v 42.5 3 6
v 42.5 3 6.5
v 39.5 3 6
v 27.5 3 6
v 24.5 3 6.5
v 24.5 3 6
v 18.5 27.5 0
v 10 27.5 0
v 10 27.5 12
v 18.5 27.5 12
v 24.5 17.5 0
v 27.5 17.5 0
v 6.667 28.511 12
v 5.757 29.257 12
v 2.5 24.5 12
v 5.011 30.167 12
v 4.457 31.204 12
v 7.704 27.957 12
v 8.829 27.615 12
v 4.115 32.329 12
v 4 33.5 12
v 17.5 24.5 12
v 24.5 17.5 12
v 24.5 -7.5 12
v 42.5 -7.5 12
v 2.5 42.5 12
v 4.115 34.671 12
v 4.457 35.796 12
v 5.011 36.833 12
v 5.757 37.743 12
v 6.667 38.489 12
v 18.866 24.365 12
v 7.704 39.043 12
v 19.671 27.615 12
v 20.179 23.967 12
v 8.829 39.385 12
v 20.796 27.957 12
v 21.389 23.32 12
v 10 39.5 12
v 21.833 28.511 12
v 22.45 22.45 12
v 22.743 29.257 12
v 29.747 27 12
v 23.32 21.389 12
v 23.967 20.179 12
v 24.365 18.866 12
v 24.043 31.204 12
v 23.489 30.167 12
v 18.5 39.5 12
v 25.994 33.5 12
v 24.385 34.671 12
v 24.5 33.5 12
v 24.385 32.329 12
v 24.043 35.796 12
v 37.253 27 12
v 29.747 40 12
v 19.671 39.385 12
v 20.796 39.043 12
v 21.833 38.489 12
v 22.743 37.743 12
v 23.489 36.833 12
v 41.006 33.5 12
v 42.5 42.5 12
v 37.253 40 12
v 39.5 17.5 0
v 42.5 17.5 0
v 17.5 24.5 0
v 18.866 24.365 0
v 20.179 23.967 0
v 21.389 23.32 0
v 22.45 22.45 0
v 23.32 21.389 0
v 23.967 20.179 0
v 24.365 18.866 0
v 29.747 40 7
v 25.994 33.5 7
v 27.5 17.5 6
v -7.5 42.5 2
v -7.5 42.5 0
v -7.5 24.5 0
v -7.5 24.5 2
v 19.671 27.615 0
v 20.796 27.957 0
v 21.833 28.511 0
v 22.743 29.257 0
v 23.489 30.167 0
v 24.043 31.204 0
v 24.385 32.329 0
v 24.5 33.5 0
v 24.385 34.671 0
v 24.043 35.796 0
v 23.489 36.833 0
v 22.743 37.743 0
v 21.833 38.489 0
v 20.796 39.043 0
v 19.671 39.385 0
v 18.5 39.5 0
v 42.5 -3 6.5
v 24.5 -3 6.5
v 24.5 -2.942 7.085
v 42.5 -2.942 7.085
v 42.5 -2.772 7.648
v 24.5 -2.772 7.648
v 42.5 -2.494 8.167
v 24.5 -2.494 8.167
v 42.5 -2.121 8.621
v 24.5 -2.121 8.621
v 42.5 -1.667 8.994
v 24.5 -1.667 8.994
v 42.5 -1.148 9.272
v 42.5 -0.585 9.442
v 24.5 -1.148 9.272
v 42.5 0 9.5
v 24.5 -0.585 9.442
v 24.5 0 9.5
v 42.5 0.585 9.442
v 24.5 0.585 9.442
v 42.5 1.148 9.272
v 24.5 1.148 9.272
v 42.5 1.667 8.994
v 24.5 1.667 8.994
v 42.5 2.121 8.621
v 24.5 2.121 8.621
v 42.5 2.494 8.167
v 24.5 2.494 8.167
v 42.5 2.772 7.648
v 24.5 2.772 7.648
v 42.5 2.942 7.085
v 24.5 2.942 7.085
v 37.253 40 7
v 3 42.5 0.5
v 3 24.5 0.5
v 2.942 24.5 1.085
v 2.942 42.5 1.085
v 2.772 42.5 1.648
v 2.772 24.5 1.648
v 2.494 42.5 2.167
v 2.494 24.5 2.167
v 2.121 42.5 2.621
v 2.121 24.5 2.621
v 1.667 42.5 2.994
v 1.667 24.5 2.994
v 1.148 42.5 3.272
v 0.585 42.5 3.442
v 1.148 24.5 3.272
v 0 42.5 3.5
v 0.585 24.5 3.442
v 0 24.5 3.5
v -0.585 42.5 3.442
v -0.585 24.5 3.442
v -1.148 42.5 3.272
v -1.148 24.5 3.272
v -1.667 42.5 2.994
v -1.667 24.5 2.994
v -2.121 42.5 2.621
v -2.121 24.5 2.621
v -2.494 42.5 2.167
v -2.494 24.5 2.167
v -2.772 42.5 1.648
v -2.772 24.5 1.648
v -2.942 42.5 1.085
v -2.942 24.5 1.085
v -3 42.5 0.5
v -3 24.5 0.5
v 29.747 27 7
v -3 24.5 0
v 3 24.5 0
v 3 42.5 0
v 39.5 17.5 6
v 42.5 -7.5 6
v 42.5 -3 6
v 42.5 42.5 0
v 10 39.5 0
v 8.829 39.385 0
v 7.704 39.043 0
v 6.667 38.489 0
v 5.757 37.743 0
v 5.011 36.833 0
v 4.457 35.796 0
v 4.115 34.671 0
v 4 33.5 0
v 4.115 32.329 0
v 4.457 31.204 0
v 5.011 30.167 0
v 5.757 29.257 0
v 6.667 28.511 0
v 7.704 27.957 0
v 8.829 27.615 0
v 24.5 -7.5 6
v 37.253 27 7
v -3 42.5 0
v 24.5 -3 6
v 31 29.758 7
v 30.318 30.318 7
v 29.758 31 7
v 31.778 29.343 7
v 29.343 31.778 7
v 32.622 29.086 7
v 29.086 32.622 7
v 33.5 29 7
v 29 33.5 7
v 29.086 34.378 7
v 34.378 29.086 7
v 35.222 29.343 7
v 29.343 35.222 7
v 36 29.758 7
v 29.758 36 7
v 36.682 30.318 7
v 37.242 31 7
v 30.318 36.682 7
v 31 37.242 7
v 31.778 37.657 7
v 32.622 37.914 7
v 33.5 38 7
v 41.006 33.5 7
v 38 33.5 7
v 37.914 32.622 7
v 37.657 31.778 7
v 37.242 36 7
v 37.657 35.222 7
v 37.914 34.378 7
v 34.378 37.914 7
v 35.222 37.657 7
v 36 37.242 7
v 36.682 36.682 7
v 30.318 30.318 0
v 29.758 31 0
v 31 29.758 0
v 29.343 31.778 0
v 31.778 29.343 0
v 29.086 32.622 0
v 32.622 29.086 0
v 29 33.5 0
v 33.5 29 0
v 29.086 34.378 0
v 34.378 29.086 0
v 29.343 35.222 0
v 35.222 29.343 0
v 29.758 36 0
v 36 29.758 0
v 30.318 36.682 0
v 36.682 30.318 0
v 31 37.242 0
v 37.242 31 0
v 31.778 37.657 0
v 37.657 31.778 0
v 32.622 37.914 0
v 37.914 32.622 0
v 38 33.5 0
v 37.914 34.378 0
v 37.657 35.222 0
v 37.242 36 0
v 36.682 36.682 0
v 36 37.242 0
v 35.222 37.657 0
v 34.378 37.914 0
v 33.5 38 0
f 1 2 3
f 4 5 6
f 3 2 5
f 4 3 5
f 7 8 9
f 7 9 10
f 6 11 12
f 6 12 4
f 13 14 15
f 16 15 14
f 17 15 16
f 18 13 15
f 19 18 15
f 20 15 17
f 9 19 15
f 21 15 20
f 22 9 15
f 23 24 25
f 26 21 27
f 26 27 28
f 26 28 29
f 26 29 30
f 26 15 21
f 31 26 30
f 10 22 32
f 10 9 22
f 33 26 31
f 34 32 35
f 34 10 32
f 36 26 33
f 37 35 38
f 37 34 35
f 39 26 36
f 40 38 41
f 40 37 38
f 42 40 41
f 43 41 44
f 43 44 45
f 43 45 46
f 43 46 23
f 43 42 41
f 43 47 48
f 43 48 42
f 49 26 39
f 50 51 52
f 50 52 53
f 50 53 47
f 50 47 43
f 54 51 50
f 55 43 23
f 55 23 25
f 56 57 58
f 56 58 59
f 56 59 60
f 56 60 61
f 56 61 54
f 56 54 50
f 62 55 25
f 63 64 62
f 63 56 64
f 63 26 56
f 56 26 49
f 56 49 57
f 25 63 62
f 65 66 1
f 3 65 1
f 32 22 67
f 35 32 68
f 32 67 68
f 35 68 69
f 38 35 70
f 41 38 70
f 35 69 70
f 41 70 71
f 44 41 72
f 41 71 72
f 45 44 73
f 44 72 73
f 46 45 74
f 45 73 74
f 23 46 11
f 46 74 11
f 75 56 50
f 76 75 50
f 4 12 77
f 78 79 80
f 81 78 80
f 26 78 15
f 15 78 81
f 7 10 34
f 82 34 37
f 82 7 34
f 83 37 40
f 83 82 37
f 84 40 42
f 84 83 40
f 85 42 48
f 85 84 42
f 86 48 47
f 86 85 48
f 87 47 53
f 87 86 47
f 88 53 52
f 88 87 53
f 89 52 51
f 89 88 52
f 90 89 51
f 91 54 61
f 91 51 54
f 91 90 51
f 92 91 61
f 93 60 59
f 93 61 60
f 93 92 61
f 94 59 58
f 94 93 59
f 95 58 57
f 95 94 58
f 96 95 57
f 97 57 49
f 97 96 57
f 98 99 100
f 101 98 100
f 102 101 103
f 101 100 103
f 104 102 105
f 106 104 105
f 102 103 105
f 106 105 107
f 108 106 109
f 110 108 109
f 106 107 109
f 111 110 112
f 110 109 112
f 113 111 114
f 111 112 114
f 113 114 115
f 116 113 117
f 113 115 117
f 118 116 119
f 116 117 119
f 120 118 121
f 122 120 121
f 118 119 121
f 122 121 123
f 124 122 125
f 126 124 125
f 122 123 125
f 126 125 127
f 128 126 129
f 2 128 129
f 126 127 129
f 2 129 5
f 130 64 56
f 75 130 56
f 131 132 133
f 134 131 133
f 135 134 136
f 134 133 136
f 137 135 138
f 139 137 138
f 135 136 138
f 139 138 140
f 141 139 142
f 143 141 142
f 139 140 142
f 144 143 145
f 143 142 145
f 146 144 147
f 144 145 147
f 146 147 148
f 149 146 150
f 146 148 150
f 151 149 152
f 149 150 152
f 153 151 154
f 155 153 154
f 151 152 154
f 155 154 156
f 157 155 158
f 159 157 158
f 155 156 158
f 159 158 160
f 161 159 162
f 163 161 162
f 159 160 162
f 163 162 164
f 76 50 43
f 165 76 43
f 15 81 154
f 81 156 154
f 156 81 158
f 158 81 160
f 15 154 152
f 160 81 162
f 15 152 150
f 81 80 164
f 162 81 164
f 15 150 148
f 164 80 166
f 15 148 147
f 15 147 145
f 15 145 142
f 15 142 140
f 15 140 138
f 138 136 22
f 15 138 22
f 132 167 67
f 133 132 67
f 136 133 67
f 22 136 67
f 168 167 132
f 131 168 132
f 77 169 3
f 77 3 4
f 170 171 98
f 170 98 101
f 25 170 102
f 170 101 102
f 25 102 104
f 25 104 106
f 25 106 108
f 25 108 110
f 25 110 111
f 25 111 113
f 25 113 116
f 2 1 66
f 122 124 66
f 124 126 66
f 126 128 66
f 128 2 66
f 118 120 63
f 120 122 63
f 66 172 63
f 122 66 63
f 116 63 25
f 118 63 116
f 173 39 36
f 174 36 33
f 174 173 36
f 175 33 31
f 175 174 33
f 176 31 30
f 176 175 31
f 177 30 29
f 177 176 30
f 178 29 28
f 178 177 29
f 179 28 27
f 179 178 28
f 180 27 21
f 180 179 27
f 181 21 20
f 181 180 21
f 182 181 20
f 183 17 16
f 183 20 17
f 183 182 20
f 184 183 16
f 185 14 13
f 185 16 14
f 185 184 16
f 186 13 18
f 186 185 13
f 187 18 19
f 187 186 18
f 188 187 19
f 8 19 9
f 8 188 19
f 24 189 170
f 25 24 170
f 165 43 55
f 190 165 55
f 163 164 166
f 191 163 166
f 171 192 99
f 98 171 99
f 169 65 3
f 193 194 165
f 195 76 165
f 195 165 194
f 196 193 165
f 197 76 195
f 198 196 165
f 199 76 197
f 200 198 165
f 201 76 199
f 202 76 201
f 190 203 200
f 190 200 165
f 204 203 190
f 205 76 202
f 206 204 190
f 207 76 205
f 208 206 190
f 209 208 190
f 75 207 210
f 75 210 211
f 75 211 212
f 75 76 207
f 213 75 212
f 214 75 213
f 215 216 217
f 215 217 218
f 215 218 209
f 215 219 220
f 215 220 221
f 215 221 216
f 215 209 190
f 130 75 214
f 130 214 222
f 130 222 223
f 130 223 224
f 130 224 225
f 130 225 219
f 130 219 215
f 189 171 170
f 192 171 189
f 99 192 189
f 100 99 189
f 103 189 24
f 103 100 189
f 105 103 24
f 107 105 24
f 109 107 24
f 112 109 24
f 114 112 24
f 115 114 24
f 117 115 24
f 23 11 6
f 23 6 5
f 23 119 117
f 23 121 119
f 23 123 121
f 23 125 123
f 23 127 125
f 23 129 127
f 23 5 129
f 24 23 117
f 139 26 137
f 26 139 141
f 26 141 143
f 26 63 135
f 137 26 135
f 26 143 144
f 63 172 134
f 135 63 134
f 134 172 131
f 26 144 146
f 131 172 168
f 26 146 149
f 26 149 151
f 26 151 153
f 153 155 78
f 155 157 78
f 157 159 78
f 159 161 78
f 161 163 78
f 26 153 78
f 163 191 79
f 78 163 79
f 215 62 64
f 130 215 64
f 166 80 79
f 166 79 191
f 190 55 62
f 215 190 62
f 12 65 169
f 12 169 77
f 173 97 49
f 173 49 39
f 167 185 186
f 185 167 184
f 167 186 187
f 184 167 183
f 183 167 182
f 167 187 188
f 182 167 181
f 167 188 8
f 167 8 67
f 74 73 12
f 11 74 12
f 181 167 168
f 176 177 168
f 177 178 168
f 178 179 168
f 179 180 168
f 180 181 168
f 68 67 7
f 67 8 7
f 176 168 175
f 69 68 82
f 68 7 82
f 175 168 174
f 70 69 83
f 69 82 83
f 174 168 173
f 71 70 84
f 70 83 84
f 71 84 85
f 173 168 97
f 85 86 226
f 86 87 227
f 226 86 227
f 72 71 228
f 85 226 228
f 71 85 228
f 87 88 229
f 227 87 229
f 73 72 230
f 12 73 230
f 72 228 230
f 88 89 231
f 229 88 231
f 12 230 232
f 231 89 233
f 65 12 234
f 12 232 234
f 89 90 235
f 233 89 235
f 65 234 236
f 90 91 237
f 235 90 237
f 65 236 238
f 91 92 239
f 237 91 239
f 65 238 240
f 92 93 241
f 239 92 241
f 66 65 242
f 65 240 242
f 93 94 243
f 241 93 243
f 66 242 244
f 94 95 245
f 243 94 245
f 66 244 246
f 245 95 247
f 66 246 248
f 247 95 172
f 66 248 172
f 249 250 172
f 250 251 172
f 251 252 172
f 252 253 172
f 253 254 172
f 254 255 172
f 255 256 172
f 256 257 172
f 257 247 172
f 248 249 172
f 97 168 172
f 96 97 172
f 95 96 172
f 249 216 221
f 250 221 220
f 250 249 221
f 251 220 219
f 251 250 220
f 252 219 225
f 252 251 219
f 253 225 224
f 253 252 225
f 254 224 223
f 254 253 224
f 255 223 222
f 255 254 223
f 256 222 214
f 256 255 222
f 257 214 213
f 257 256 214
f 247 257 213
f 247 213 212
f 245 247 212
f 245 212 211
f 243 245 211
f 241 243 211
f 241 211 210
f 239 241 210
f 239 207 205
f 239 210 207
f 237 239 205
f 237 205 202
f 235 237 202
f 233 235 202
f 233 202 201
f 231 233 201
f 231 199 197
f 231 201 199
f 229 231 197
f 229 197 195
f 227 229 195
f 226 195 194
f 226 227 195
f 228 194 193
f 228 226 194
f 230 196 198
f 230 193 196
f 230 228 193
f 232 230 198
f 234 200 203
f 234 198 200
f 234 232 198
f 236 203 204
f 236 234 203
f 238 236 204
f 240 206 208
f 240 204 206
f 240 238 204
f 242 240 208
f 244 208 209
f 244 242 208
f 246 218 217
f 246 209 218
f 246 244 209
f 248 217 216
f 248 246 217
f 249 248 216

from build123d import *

# Parameters (mm, degrees)
SKIZZE2_R                       = 4.5
AUFSATZ_LINEAR_AUSTRAGEN1_DEPTH = 12
SCHNITT_LINEAR_AUSTRAGEN6_DEPTH = 5
SCHNITT_LINEAR_AUSTRAGEN1_DEPTH = 62.290292869
SCHNITT_LINEAR_AUSTRAGEN5_DEPTH = 62.290292869
SKIZZE6_W                       = 18
SKIZZE6_H                       = 25
SCHNITT_LINEAR_AUSTRAGEN7_DEPTH = 6
AUFSATZ_LINEAR_AUSTRAGEN2_DEPTH = 3
AUFSATZ_LINEAR_AUSTRAGEN3_DEPTH = 3
SCHNITT_LINEAR_AUSTRAGEN8_DEPTH = 62.290292869
FASE1_SIZE                      = 10


with BuildPart() as part:
    # Skizze2 → Aufsatz-Linear austragen1 (new body)
    with BuildSketch(Plane.XY):
        with BuildLine():
            Line((-7.5, 42.5), (-7.5, 24.5))
            Line((-7.5, 24.5), (17.5, 24.5))
            ThreePointArc((17.5, 24.5), (22.449747468, 22.449747468), (24.5, 17.5))
            Line((24.5, 17.5), (24.5, -7.5))
            Line((24.5, -7.5), (42.5, -7.5))
            Line((42.5, -7.5), (42.5, 42.5))
            Line((42.5, 42.5), (-7.5, 42.5))
        make_face()
        with Locations((33.5, 33.5)):
            Circle(SKIZZE2_R, mode=Mode.SUBTRACT)
    extrude(amount=AUFSATZ_LINEAR_AUSTRAGEN1_DEPTH)

    # Skizze5 → Schnitt-Linear austragen6 (cut)
    with BuildSketch(Plane.XY.offset(12)):
        Polygon((41.005553499, 33.5), (37.25277675, 40), (29.74722325, 40), (25.994446501, 33.5), (29.74722325, 27), (37.25277675, 27), align=None)
    extrude(amount=-SCHNITT_LINEAR_AUSTRAGEN6_DEPTH, mode=Mode.SUBTRACT)

    # Skizze3 → Schnitt-Linear austragen1 (cut, through all)
    with BuildSketch(Plane(origin=(0, 0, 0), x_dir=(1, 0, 0), z_dir=(0, 1, 0))):
        with BuildLine():
            Line((3, 4.576951254), (3, -0.5))
            ThreePointArc((3, -0.5), (0, -3.5), (-3, -0.5))
            Line((-3, -0.5), (-3, 4.576951254))
            ThreePointArc((-3, 4.576951254), (0, 7.576951254), (3, 4.576951254))
        make_face()
    extrude(amount=SCHNITT_LINEAR_AUSTRAGEN1_DEPTH, mode=Mode.SUBTRACT)

    # Skizze4 → Schnitt-Linear austragen5 (cut, through all)
    with BuildSketch(Plane(origin=(0, 0, 0), x_dir=(0, 0, -1), z_dir=(1, 0, 0))):
        with BuildLine():
            Line((-0.5, -3), (-6.5, -3))
            ThreePointArc((-6.5, -3), (-9.5, 0), (-6.5, 3))
            Line((-6.5, 3), (-0.5, 3))
            ThreePointArc((-0.5, 3), (2.5, 0), (-0.5, -3))
        make_face()
    extrude(amount=SCHNITT_LINEAR_AUSTRAGEN5_DEPTH, mode=Mode.SUBTRACT)

    # Skizze6 → Schnitt-Linear austragen7 (cut)
    with BuildSketch(Plane(origin=(0, 0, 0), x_dir=(-1, 0, 0), z_dir=(0, 0, -1))):
        with Locations((-33.5, 5)):
            Rectangle(SKIZZE6_W, SKIZZE6_H)
    extrude(amount=-SCHNITT_LINEAR_AUSTRAGEN7_DEPTH, mode=Mode.SUBTRACT)

    # Skizze7 → Aufsatz-Linear austragen2 (add)
    with BuildSketch(Plane(origin=(42.5, 0, 0), x_dir=(0, 0, -1), z_dir=(1, 0, 0))):
        Polygon((-6, 3), (-6, 17.5), (0, 17.5), align=None)
    extrude(amount=-AUFSATZ_LINEAR_AUSTRAGEN2_DEPTH)

    # Skizze8 → Aufsatz-Linear austragen3 (add)
    with BuildSketch(Plane.ZY.offset(-24.5)):
        Polygon((6, 3), (6, 17.5), (0, 17.5), align=None)
    extrude(amount=-AUFSATZ_LINEAR_AUSTRAGEN3_DEPTH)

    # Skizze9 → Schnitt-Linear austragen8 (cut, through all)
    with BuildSketch(Plane(origin=(0, 0, 0), x_dir=(-1, 0, 0), z_dir=(0, 0, -1))):
        with BuildLine():
            Line((-18.5, 39.5), (-10, 39.5))
            ThreePointArc((-10, 39.5), (-4, 33.5), (-10, 27.5))
            Line((-10, 27.5), (-18.5, 27.5))
            ThreePointArc((-18.5, 27.5), (-24.5, 33.5), (-18.5, 39.5))
        make_face()
    extrude(amount=-SCHNITT_LINEAR_AUSTRAGEN8_DEPTH, mode=Mode.SUBTRACT)

    # Fase1
    fase1_edges = [part.edges().sort_by_distance(p)[0] for p in [
        (-7.5, 33.5, 12),
    ]]
    chamfer(fase1_edges, length=FASE1_SIZE)


solid = part.part
